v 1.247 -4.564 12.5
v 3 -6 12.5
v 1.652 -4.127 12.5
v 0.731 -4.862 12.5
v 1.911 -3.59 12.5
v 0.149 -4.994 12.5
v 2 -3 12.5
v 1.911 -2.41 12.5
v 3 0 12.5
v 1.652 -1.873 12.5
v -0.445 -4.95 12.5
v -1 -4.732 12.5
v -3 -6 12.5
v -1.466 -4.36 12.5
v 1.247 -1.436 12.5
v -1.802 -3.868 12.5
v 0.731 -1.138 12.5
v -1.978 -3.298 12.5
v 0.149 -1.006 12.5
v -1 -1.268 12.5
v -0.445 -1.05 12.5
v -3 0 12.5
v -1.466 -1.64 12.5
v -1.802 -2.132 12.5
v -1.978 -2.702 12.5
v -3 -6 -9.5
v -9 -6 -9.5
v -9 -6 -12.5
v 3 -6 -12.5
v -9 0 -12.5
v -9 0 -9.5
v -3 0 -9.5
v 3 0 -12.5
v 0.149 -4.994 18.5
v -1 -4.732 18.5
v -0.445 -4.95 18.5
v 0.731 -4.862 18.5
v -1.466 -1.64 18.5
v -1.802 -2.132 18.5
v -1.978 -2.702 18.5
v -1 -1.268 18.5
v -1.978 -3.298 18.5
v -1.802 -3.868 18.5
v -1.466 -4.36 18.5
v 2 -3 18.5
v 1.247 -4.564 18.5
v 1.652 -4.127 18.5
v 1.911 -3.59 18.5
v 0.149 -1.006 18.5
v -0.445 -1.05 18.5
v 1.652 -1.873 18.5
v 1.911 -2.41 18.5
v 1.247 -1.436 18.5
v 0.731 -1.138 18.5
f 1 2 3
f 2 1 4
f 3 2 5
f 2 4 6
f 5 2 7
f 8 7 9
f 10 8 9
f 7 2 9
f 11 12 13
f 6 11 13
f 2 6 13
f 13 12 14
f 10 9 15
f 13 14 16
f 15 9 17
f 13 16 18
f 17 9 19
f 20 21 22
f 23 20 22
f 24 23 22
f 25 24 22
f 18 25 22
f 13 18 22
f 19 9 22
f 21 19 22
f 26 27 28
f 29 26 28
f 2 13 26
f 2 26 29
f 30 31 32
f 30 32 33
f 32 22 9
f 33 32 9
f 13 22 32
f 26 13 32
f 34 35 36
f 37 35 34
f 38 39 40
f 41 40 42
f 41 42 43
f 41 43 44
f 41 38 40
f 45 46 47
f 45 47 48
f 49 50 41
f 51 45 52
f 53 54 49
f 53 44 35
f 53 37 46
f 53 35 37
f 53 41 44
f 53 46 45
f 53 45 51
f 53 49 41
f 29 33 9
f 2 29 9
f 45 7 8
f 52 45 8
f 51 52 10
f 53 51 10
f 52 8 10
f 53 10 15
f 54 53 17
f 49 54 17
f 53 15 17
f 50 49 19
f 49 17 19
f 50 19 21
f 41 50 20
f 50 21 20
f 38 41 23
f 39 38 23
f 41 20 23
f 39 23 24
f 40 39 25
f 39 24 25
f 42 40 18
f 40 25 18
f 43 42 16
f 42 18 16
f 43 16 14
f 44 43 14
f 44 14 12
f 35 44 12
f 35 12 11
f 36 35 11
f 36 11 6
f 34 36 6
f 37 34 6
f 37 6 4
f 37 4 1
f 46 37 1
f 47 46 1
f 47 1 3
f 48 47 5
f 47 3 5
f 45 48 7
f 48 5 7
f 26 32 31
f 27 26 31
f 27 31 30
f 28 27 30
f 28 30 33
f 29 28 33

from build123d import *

# Parameters (mm, degrees)
F1_DEPTH = 6
F2_R     = 2
F3_DEPTH = 6


with BuildPart() as f1:
    # F0 (on Front) → F1 (new body)
    with BuildSketch(Plane.XZ):
        Polygon((3, 12.5), (-3, 12.5), (-3, -9.5), (-9, -9.5), (-9, -12.5), (-3, -12.5), (3, -12.5), align=None)
    extrude(amount=F1_DEPTH)

    # F2 (on face) → F3 (join)
    with BuildSketch(Plane.XY.offset(12.5)):
        with Locations((0, -3)):
            Circle(F2_R)
    extrude(amount=F3_DEPTH)


solid = f1.part
